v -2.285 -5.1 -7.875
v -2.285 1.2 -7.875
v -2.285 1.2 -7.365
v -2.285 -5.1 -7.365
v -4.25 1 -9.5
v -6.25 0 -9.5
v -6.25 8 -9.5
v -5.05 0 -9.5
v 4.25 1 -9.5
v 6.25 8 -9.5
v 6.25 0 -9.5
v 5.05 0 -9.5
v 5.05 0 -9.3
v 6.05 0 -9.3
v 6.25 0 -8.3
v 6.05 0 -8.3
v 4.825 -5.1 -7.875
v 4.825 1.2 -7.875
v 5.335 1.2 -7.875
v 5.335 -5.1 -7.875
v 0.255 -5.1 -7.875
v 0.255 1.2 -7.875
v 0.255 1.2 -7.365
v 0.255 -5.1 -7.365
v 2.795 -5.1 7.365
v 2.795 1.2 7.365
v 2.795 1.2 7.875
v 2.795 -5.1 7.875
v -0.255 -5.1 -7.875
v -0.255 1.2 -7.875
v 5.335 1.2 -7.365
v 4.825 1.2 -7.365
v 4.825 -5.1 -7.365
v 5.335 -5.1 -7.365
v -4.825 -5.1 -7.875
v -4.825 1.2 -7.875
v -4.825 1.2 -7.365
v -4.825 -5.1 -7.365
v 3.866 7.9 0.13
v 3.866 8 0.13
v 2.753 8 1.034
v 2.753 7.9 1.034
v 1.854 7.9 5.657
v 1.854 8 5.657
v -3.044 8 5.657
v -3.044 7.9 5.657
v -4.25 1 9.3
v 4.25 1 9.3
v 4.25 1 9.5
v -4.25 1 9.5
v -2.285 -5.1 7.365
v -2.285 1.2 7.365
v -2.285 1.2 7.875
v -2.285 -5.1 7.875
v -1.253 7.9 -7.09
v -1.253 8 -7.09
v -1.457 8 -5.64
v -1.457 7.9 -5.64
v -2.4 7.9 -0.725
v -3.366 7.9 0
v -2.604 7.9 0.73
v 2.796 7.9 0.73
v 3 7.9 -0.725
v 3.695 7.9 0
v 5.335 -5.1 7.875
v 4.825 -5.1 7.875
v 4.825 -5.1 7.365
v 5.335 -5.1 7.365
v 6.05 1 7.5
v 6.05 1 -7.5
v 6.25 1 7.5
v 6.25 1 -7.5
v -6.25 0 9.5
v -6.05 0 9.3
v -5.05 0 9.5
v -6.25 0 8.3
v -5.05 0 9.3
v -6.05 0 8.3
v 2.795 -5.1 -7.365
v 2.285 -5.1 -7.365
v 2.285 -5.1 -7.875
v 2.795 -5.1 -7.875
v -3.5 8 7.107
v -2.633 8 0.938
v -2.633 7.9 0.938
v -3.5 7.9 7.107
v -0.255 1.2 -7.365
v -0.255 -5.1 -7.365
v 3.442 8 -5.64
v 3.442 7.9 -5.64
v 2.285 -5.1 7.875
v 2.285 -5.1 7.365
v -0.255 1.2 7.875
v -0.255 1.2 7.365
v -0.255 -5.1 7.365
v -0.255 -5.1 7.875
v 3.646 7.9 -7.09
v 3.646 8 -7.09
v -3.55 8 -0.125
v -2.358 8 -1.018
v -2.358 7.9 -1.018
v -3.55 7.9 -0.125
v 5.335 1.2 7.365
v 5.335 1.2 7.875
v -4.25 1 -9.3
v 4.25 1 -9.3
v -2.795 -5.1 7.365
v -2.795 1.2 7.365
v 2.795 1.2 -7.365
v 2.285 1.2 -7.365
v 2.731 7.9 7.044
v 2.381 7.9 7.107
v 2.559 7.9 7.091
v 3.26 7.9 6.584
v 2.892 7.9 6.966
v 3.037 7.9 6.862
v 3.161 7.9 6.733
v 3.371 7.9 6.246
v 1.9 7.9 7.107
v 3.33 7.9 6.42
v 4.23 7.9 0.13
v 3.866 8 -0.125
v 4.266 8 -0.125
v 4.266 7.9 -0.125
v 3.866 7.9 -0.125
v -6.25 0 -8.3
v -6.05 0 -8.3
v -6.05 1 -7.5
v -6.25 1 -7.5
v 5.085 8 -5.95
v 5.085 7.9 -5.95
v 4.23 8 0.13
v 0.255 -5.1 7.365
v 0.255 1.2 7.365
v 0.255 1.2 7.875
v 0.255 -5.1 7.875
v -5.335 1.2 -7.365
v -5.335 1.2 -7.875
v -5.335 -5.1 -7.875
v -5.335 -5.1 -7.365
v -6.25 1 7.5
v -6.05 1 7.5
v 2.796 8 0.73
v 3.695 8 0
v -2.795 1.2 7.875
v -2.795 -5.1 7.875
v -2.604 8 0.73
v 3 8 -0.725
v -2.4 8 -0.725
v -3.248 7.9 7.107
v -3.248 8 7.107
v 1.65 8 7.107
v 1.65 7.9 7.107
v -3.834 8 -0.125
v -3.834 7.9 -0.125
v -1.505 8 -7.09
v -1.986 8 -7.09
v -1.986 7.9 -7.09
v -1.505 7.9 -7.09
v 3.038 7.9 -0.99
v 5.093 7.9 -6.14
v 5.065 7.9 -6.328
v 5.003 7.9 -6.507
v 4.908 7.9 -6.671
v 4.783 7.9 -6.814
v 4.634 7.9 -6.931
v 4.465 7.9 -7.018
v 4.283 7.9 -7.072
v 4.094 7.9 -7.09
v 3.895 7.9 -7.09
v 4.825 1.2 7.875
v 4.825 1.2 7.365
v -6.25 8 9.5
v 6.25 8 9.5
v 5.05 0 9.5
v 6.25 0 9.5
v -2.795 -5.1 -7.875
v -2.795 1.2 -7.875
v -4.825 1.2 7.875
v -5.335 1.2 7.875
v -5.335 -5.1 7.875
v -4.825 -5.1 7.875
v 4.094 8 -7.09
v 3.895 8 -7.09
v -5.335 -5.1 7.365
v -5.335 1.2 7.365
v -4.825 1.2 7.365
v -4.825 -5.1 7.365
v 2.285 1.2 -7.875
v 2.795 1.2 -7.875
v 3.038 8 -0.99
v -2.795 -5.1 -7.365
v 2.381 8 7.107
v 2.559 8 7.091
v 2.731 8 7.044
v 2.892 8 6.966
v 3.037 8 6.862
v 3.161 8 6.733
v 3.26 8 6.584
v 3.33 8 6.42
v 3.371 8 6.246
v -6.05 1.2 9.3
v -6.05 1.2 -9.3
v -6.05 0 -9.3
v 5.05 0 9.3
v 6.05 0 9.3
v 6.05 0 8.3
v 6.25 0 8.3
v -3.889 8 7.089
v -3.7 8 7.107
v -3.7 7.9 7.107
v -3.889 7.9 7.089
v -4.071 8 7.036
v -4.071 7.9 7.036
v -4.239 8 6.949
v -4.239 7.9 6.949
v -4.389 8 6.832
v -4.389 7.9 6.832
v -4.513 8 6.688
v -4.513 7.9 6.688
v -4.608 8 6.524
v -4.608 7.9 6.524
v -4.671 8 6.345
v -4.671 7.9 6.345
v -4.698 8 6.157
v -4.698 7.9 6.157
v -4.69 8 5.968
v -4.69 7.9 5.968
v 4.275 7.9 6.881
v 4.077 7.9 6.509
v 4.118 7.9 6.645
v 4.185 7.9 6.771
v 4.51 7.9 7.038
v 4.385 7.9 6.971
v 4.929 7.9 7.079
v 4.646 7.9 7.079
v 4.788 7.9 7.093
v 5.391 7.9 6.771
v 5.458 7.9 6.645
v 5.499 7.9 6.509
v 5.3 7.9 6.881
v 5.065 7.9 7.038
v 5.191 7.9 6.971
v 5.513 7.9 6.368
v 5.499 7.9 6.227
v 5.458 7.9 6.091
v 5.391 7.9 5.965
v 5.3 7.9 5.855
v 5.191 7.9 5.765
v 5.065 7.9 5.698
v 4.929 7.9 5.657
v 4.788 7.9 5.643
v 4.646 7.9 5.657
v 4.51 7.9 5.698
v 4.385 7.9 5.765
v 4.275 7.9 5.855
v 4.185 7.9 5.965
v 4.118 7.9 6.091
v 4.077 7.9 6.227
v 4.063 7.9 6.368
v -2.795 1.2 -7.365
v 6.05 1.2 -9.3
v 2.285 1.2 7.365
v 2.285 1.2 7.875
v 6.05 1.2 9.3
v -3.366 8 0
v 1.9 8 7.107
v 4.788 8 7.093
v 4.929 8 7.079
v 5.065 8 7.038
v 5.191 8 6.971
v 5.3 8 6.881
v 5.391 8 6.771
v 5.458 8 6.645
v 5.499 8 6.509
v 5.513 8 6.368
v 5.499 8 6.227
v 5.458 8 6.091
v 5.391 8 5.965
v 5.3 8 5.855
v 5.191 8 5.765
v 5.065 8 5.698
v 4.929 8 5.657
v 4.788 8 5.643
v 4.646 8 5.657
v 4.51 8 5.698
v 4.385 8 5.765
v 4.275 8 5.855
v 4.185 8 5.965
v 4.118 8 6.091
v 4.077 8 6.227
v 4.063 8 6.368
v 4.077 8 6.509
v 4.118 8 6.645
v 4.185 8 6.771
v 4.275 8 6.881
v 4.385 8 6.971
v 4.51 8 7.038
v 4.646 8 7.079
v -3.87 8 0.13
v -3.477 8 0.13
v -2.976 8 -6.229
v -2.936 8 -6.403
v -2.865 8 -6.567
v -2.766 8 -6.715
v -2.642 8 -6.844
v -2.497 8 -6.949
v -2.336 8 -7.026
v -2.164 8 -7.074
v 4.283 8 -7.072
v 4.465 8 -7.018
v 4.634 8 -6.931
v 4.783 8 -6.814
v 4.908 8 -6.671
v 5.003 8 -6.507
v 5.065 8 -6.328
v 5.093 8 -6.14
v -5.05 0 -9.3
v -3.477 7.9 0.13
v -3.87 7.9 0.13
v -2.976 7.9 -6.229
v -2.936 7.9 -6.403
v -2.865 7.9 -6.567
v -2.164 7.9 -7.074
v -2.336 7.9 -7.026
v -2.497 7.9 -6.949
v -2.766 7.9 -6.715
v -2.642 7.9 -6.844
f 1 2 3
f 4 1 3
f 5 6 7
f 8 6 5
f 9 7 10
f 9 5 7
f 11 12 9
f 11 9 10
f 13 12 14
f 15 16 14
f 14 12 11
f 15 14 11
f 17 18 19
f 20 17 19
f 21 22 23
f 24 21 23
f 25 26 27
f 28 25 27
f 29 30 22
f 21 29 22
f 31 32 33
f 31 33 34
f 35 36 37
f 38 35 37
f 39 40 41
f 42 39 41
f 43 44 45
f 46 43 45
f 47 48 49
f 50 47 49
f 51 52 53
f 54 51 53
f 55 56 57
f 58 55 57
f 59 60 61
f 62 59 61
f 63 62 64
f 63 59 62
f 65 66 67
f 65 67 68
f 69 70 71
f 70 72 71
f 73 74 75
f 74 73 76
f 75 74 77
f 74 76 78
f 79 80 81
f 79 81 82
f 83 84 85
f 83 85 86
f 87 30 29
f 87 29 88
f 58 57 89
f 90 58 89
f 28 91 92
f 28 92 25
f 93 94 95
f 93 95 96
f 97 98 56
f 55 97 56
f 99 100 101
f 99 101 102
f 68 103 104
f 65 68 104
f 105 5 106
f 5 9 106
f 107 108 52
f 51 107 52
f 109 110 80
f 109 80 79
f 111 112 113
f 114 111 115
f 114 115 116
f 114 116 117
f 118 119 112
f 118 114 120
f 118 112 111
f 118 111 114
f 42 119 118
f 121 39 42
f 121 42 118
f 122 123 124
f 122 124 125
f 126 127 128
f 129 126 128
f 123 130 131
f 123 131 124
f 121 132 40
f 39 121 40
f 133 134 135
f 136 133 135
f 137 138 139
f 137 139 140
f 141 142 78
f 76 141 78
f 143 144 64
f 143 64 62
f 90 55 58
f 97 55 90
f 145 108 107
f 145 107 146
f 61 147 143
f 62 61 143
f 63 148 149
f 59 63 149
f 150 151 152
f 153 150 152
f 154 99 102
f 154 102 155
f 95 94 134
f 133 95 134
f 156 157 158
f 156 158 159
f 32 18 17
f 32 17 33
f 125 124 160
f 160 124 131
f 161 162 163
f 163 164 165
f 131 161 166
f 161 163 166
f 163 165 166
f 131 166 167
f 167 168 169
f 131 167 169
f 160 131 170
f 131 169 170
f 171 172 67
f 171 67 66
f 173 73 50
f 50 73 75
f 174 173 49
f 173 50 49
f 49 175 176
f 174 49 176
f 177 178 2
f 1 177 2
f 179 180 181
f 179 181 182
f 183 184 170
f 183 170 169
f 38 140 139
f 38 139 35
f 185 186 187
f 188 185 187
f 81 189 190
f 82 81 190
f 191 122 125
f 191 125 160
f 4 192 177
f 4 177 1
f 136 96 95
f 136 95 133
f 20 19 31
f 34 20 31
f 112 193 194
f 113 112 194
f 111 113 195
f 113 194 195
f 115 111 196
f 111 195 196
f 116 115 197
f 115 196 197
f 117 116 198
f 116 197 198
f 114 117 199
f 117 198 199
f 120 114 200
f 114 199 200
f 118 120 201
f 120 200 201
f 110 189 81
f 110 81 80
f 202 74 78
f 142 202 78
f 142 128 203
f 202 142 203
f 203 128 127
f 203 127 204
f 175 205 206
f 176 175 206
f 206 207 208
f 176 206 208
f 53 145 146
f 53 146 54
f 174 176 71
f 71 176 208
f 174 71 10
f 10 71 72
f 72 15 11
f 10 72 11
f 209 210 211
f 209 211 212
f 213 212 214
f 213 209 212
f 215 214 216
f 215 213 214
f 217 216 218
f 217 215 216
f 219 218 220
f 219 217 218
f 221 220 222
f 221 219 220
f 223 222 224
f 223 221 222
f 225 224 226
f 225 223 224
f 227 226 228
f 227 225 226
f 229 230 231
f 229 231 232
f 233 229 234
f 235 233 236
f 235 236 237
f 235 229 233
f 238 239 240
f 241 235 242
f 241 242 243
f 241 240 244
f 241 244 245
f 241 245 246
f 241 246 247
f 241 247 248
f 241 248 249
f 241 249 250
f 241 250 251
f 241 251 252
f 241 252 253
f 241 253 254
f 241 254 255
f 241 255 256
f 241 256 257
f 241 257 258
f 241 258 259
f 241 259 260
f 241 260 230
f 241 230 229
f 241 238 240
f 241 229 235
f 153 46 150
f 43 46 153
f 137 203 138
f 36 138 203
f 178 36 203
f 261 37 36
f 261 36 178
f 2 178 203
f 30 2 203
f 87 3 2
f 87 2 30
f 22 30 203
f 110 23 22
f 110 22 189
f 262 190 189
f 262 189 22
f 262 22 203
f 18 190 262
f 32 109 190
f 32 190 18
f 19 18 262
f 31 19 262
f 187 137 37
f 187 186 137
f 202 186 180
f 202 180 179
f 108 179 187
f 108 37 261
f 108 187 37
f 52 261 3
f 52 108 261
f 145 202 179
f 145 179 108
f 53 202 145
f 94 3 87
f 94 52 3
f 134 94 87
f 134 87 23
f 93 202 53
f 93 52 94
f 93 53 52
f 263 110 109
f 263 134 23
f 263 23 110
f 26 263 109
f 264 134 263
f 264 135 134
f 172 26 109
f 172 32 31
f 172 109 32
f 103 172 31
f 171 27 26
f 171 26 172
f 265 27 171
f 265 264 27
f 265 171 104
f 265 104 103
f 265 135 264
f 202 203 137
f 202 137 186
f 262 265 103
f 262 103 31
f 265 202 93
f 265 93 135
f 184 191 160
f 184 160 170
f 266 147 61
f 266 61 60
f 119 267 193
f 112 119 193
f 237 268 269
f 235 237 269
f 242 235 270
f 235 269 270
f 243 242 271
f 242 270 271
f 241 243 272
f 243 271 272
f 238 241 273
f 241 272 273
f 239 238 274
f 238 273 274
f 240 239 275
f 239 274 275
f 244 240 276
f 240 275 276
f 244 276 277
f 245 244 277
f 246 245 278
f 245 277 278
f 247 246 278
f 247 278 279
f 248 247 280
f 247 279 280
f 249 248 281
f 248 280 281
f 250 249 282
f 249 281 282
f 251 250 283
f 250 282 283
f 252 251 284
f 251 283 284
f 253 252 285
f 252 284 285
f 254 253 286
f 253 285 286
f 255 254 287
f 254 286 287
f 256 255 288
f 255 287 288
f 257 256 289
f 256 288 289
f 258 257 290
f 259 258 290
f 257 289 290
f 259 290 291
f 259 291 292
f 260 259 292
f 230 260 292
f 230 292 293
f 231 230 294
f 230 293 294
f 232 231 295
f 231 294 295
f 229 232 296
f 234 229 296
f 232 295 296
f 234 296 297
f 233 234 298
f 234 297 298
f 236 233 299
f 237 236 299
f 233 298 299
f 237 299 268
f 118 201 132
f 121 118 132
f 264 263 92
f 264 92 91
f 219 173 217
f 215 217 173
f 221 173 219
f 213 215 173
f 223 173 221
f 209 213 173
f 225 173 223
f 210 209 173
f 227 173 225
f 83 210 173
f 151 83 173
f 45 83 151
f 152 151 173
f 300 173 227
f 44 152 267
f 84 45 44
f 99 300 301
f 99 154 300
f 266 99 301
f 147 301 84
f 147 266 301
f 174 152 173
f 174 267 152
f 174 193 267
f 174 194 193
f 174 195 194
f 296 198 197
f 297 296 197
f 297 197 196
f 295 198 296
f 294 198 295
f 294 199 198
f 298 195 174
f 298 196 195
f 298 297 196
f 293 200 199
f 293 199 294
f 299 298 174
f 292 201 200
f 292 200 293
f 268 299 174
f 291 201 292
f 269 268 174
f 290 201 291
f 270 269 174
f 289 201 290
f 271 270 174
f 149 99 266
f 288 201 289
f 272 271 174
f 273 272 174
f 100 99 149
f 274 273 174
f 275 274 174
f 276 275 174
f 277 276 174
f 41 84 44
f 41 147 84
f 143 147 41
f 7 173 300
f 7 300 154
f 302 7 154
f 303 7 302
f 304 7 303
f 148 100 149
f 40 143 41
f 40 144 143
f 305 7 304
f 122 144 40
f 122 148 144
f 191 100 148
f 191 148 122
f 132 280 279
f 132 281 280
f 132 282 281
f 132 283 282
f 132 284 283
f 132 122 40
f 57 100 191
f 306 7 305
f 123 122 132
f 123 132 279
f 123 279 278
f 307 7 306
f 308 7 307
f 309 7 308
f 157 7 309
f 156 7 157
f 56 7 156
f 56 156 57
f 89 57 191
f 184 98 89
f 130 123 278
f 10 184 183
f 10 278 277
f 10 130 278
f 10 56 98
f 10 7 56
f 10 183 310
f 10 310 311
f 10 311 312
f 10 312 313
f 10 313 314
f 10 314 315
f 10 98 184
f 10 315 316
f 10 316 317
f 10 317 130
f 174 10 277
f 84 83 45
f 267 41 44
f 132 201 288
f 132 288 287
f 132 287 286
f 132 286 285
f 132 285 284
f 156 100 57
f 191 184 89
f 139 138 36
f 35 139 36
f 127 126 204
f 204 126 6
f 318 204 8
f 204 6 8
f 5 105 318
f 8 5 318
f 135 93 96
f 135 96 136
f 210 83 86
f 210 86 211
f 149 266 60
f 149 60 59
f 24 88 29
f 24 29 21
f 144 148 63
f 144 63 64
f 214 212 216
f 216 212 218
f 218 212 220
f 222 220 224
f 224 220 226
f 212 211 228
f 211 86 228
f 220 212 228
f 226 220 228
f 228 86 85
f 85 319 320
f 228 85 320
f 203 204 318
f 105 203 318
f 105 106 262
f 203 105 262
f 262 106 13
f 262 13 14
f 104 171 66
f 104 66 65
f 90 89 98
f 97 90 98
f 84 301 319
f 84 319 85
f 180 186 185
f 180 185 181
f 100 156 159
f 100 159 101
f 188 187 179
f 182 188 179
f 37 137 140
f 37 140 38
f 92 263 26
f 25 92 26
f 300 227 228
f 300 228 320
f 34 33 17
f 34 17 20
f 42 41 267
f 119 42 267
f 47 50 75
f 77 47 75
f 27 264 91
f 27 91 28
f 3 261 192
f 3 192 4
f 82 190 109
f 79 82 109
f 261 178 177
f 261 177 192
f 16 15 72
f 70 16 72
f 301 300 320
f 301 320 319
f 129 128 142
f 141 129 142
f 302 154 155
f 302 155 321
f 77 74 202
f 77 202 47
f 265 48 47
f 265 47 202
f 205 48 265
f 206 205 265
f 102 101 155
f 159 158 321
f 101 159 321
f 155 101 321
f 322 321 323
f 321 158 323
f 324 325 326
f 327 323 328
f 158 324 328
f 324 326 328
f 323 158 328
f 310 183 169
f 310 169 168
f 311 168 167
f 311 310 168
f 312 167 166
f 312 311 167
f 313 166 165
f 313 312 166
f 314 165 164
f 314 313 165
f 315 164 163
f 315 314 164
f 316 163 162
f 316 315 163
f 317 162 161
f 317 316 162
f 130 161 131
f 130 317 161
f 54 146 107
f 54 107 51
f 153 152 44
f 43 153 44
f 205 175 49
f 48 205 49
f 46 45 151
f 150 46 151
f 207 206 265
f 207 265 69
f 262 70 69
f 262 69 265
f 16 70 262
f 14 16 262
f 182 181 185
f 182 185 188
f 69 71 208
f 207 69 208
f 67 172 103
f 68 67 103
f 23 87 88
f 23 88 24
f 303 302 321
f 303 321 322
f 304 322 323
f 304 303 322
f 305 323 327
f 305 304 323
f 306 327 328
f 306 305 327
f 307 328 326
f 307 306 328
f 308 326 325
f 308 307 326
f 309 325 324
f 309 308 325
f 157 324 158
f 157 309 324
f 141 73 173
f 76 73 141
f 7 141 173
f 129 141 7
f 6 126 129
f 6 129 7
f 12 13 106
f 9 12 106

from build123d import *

# Parameters (mm, degrees)
CROQUIS1_W              = 12.5
CROQUIS1_H              = 19
SALIENTE_EXTRUIR1_DEPTH = 8
CROQUIS4_W              = 12.1
CROQUIS4_H              = 18.6
CORTAR_EXTRUIR3_DEPTH   = 1
CORTAR_EXTRUIR1_DEPTH   = 18.621010187
CORTAR_EXTRUIR2_DEPTH   = 22.542109925
CROQUIS5_W              = 12.1
CROQUIS5_H              = 18.6
CORTAR_EXTRUIR4_DEPTH   = 0.2
CROQUIS6_W              = 0.51
CROQUIS6_H              = 0.51
SALIENTE_EXTRUIR2_DEPTH = 6.3
CROQUIS7_R              = 0.725
CORTAR_EXTRUIR5_DEPTH   = 0.1


with BuildPart() as part:
    # Croquis1 → Saliente-Extruir1 (new body)
    with BuildSketch(Plane(origin=(0, 0, 0), x_dir=(1, 0, 0), z_dir=(0, 1, 0))):
        Rectangle(CROQUIS1_W, CROQUIS1_H)
    extrude(amount=SALIENTE_EXTRUIR1_DEPTH)

    # Croquis4 → Cortar-Extruir3 (cut)
    with BuildSketch(Plane(origin=(0, 0, 0), x_dir=(1, 0, 0), z_dir=(0, 1, 0))):
        Rectangle(CROQUIS4_W, CROQUIS4_H)
    extrude(amount=CORTAR_EXTRUIR3_DEPTH, mode=Mode.SUBTRACT)

    # Croquis2 → Cortar-Extruir1 (cut, through all)
    with BuildSketch(Plane(origin=(6.25, 0, 0), x_dir=(0, 0, -1), z_dir=(1, 0, 0))):
        Polygon((-8.3, 0), (0, 0), (0, 1), (-7.5, 1), align=None)
        Polygon((0, 1), (0, 0), (8.3, 0), (7.5, 1), align=None)
    extrude(amount=-CORTAR_EXTRUIR1_DEPTH, mode=Mode.SUBTRACT)

    # Croquis3 → Cortar-Extruir2 (cut, through all)
    with BuildSketch(Plane.XY.offset(9.5)):
        Polygon((0, 1), (0, 0), (5.05, 0), (4.25, 1), align=None)
        Polygon((-5.05, 0), (0, 0), (0, 1), (-4.25, 1), align=None)
    extrude(amount=-CORTAR_EXTRUIR2_DEPTH, mode=Mode.SUBTRACT)

    # Croquis5 → Cortar-Extruir4 (cut)
    with BuildSketch(Plane.XZ.offset(-1)):
        Rectangle(CROQUIS5_W, CROQUIS5_H)
    extrude(amount=-CORTAR_EXTRUIR4_DEPTH, mode=Mode.SUBTRACT)

    # Croquis6 → Saliente-Extruir2 (add)
    with BuildSketch(Plane.XZ.offset(-1.2)):
        with Locations((5.08, 7.62)):
            Rectangle(CROQUIS6_W, CROQUIS6_H)
        with Locations((-5.08, 7.62)):
            Rectangle(CROQUIS6_W, CROQUIS6_H)
        with Locations((-2.54, 7.62)):
            Rectangle(CROQUIS6_W, CROQUIS6_H)
        with Locations((0, 7.62)):
            Rectangle(CROQUIS6_W, CROQUIS6_H)
        with Locations((2.54, 7.62)):
            Rectangle(CROQUIS6_W, CROQUIS6_H)
        with Locations((5.08, -7.62)):
            Rectangle(CROQUIS6_W, CROQUIS6_H)
        with Locations((2.54, -7.62)):
            Rectangle(CROQUIS6_W, CROQUIS6_H)
        with Locations((0, -7.62)):
            Rectangle(CROQUIS6_W, CROQUIS6_H)
        with Locations((-2.54, -7.62)):
            Rectangle(CROQUIS6_W, CROQUIS6_H)
        with Locations((-5.08, -7.62)):
            Rectangle(CROQUIS6_W, CROQUIS6_H)
    extrude(amount=SALIENTE_EXTRUIR2_DEPTH)

    # Croquis7 → Cortar-Extruir5 (cut)
    with BuildSketch(Plane(origin=(0, 8, 0), x_dir=(1, 0, 0), z_dir=(0, 1, 0))):
        with BuildLine():
            Line((5.08455374, 5.950418058), (4.266083352, 0.125))
            Line((4.266083352, 0.125), (3.866083352, 0.125))
            Line((3.866083352, 0.125), (3.037577222, 0.989725951))
            Line((3.037577222, 0.989725951), (3.894601803, 7.089551363))
            Line((3.894601803, 7.089551363), (4.094280079, 7.089551363))
            ThreePointArc((4.094280079, 7.089551363), (4.848976476, 6.745625556), (5.08455374, 5.950418058))
        make_face()
        with BuildLine():
            Line((1.9, -7.106917481), (2.380677984, -7.106917481))
            ThreePointArc((2.380677984, -7.106917481), (3.036752178, -6.861613878), (3.370951645, -6.246050786))
            Line((3.370951645, -6.246050786), (4.230255889, -0.13))
            Line((4.230255889, -0.13), (3.866081115, -0.13))
            Line((3.866081115, -0.13), (2.753310906, -1.033523948))
            Line((2.753310906, -1.033523948), (1.9, -7.106917481))
        make_face()
        Polygon((0, 0.725), (-2.399616736, 0.725), (-2.604044024, -0.73), (0, -0.73), (2.795955976, -0.73), (3.000383264, 0.725), align=None)
        Polygon((1.853724789, -5.656917481), (-3.043819744, -5.656917481), (-3.247544533, -7.106917481), (1.65, -7.106917481), align=None)
        with BuildLine():
            ThreePointArc((-3.699678276, -7.106917481), (-4.454374673, -6.762991674), (-4.689951937, -5.967784176))
            Line((-4.689951937, -5.967784176), (-3.869744111, -0.13))
            Line((-3.869744111, -0.13), (-3.476909246, -0.13))
            Line((-3.476909246, -0.13), (-2.633262018, -0.937957469))
            Line((-2.633262018, -0.937957469), (-3.5, -7.106917481))
            Line((-3.5, -7.106917481), (-3.699678276, -7.106917481))
        make_face()
        with BuildLine():
            ThreePointArc((-2.976349842, 6.228684668), (-2.642150375, 6.84424776), (-1.986076181, 7.089551363))
            Line((-1.986076181, 7.089551363), (-1.505398197, 7.089551363))
            Line((-1.505398197, 7.089551363), (-2.358391548, 1.018418011))
            Line((-2.358391548, 1.018418011), (-3.549623917, 0.125))
            Line((-3.549623917, 0.125), (-3.833916648, 0.125))
            Line((-3.833916648, 0.125), (-2.976349842, 6.228684668))
        make_face()
        Polygon((-2.399616736, 0.725), (-2.604044024, -0.73), (-3.366290182, 0), align=None)
        Polygon((3.000383264, 0.725), (3.69501599, 0), (2.795955976, -0.73), align=None)
        with Locations(Location((4.787756453, -6.368008077, 0), (0, 0, 270))):
            Circle(CROQUIS7_R)
        Polygon((-1.25294273, 7.089551363), (-1.456667518, 5.639551363), (0, 5.639551363), (3.441812575, 5.639551363), (3.645537364, 7.089551363), (0, 7.089551363), align=None)
    extrude(amount=-CORTAR_EXTRUIR5_DEPTH, mode=Mode.SUBTRACT)


solid = part.part
